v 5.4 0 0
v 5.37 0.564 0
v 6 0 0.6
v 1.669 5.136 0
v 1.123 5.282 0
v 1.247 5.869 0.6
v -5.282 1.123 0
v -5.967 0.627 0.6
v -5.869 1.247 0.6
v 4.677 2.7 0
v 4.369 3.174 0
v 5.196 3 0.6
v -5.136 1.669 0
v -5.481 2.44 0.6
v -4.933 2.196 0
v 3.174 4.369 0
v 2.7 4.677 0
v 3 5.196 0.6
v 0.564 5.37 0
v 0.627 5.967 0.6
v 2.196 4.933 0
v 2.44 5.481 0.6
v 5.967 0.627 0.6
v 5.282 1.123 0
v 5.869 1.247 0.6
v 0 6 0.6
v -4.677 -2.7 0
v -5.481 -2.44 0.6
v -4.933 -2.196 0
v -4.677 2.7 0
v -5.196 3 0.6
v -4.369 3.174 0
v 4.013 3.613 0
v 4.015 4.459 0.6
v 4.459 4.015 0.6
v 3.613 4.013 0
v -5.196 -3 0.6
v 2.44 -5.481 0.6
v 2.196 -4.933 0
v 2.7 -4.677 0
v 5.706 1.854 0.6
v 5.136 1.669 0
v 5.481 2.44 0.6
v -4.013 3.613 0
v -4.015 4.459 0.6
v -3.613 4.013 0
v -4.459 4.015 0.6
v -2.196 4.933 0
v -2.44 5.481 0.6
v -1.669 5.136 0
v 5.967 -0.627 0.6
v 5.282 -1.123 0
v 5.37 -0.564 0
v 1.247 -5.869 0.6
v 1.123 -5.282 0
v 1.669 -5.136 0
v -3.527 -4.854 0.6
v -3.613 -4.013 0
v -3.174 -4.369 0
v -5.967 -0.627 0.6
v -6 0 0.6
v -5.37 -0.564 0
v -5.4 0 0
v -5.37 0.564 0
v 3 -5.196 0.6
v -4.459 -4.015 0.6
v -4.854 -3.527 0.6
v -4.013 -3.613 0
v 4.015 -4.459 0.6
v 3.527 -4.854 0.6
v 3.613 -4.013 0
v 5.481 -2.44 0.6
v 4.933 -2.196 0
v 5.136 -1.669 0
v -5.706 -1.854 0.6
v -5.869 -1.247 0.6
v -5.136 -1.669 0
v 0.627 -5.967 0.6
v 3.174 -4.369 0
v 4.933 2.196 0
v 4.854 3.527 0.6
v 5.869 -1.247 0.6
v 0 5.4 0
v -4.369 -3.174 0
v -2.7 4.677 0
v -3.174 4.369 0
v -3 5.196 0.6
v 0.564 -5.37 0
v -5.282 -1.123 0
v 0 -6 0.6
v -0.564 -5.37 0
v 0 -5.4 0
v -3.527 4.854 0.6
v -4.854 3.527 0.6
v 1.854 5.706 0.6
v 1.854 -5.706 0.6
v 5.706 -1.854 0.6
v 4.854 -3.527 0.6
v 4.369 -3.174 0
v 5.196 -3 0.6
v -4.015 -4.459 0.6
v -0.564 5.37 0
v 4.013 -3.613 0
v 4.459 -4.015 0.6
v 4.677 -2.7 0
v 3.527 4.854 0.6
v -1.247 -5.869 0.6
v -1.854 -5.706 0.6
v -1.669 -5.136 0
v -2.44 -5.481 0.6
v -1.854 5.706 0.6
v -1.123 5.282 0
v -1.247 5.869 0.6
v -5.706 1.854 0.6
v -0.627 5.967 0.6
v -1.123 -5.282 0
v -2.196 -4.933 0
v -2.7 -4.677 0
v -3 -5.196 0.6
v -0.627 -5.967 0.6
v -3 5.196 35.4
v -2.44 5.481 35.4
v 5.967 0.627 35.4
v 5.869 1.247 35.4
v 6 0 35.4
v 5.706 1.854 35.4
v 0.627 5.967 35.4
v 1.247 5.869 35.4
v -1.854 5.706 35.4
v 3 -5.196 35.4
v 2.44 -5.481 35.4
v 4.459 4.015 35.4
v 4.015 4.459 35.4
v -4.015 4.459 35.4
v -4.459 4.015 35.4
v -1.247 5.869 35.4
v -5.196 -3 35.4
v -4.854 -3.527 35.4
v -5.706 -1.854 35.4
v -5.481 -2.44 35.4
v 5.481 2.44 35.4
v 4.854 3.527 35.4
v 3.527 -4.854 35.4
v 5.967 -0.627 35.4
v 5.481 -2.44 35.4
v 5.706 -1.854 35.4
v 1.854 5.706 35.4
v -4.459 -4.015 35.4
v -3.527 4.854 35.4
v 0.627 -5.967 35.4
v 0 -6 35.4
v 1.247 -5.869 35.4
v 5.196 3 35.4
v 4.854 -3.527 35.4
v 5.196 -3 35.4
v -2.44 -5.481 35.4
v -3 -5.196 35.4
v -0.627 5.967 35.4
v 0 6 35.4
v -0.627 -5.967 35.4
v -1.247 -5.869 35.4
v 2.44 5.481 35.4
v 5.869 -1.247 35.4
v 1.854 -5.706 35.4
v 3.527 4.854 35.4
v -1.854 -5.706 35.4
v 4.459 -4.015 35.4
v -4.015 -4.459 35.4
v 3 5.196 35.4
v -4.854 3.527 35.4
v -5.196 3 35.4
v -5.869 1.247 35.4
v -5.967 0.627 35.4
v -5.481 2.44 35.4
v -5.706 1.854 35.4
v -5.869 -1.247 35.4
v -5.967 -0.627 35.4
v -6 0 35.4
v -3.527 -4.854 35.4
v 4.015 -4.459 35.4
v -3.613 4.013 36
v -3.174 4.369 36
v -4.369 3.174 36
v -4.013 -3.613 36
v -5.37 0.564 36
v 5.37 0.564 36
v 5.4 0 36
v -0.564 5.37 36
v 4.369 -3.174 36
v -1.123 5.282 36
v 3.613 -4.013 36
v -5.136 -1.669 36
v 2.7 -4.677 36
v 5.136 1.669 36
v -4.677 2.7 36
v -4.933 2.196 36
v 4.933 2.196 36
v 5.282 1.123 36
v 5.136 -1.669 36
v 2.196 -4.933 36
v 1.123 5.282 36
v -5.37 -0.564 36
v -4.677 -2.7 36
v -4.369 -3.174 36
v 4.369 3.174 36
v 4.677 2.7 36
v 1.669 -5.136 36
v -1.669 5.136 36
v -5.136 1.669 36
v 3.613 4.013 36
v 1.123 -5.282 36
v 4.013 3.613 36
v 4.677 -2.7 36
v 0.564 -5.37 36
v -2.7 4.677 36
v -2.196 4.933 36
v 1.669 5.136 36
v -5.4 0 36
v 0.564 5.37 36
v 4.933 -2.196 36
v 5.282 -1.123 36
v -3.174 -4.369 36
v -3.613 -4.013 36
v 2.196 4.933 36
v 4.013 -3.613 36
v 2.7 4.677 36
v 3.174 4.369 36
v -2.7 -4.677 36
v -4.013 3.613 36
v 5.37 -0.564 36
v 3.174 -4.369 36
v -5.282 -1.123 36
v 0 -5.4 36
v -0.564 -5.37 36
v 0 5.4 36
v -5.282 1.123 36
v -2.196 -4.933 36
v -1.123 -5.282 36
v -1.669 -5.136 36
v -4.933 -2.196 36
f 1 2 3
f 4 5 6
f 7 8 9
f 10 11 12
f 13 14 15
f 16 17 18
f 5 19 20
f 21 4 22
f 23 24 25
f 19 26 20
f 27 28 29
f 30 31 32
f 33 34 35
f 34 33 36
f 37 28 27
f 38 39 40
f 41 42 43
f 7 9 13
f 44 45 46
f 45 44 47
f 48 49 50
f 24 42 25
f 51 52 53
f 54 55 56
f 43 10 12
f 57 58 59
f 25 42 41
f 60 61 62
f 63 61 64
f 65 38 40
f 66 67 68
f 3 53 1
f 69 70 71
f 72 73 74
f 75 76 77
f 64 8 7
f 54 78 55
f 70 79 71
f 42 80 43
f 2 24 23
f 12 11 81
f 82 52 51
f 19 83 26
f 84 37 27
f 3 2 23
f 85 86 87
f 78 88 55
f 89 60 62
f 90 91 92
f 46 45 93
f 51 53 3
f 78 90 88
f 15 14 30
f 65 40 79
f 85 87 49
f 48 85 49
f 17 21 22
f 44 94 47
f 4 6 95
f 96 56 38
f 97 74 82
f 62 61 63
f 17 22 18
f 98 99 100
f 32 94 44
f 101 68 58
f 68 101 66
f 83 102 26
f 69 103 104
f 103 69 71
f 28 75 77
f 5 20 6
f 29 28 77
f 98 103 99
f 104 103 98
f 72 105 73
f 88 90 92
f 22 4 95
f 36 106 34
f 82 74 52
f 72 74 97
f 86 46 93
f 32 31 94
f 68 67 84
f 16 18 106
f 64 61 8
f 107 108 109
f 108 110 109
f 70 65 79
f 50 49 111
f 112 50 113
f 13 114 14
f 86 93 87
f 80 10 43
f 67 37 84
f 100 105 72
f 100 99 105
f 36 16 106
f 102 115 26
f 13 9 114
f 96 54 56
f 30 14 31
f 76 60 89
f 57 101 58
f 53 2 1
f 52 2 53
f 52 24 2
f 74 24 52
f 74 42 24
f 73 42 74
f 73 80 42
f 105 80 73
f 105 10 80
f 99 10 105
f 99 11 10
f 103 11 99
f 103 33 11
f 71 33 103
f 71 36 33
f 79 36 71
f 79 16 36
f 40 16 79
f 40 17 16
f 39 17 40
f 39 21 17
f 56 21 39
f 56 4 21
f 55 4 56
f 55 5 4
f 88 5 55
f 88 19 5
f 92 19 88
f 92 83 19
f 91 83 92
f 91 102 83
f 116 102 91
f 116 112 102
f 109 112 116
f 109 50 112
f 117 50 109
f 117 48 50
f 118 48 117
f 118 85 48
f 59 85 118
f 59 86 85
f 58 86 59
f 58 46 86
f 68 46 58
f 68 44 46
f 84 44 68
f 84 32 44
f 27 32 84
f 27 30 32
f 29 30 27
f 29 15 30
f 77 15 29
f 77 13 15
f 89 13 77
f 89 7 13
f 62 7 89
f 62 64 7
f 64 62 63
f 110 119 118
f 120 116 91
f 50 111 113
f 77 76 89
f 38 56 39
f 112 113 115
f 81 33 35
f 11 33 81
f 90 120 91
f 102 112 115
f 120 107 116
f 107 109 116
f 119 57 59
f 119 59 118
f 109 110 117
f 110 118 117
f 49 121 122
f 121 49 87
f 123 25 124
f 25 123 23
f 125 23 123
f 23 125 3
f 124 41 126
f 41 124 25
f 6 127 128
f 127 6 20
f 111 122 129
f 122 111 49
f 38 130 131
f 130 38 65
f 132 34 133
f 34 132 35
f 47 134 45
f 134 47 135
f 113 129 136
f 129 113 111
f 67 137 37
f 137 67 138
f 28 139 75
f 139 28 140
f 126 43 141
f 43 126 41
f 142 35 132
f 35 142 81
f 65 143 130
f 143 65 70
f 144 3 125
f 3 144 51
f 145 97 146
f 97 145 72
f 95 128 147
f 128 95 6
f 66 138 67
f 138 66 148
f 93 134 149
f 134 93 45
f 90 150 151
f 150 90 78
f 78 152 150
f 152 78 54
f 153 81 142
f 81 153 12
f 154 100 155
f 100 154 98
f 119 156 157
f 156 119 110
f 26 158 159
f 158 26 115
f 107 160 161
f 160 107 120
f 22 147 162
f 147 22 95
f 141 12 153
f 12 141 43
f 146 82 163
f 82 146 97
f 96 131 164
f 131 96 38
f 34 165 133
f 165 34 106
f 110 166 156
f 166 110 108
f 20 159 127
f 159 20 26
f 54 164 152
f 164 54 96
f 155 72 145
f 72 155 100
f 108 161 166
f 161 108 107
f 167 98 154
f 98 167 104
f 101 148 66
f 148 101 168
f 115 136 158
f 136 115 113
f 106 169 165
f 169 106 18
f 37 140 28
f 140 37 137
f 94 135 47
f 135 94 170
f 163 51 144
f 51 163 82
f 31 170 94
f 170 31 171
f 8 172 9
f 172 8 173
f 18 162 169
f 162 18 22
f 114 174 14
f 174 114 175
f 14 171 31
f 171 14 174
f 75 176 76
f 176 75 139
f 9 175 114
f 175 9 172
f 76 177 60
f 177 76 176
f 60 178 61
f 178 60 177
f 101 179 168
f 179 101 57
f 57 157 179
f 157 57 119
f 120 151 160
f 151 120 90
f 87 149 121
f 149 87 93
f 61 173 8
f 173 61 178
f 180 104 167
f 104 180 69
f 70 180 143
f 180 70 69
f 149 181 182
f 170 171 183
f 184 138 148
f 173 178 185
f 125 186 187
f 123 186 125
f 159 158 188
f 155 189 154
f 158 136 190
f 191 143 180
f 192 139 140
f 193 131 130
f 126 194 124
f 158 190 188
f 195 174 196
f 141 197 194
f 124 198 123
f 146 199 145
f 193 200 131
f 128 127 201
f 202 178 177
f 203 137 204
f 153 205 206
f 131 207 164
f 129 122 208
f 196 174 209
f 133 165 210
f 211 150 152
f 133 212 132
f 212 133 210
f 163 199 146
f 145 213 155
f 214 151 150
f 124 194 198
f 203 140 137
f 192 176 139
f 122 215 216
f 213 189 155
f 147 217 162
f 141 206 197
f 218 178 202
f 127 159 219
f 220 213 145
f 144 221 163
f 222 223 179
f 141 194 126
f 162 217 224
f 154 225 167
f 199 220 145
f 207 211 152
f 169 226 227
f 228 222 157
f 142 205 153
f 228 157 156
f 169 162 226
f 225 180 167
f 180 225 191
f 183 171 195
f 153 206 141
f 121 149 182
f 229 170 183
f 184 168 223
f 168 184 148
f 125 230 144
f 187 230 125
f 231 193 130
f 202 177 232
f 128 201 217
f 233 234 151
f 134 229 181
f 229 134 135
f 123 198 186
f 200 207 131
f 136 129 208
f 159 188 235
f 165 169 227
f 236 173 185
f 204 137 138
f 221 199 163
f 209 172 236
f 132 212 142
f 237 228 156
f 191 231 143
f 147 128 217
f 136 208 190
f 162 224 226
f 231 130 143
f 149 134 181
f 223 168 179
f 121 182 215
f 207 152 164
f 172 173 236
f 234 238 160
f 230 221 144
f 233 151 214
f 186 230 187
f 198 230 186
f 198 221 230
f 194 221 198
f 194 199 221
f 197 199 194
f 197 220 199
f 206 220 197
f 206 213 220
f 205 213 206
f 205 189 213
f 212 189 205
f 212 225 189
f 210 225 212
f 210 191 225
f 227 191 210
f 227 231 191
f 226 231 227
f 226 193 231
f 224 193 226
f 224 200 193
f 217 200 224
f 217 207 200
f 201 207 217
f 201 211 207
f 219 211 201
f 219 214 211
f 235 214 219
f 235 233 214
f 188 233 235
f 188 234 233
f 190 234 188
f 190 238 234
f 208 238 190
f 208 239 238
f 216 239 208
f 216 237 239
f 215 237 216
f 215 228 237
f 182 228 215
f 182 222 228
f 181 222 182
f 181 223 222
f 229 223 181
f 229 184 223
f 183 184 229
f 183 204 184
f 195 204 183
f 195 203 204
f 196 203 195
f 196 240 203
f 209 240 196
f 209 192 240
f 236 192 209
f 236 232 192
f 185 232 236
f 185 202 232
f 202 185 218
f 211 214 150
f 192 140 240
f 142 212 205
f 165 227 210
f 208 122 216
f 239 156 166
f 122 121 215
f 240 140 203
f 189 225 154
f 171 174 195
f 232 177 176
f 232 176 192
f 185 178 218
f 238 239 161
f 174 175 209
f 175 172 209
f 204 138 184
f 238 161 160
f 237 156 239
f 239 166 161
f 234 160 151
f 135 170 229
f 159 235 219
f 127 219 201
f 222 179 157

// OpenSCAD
// Chamfered dowel pin.
$fn = 60;
eps = 0.02;
diameter = 12;
length = 36;
chamfer = 0.6;
union() {
    cylinder(d1 = diameter - 2 * chamfer, d2 = diameter, h = chamfer);
    translate([0, 0, chamfer]) cylinder(d = diameter, h = length - 2 * chamfer);
    translate([0, 0, length - chamfer]) cylinder(d1 = diameter, d2 = diameter - 2 * chamfer, h = chamfer);
}
